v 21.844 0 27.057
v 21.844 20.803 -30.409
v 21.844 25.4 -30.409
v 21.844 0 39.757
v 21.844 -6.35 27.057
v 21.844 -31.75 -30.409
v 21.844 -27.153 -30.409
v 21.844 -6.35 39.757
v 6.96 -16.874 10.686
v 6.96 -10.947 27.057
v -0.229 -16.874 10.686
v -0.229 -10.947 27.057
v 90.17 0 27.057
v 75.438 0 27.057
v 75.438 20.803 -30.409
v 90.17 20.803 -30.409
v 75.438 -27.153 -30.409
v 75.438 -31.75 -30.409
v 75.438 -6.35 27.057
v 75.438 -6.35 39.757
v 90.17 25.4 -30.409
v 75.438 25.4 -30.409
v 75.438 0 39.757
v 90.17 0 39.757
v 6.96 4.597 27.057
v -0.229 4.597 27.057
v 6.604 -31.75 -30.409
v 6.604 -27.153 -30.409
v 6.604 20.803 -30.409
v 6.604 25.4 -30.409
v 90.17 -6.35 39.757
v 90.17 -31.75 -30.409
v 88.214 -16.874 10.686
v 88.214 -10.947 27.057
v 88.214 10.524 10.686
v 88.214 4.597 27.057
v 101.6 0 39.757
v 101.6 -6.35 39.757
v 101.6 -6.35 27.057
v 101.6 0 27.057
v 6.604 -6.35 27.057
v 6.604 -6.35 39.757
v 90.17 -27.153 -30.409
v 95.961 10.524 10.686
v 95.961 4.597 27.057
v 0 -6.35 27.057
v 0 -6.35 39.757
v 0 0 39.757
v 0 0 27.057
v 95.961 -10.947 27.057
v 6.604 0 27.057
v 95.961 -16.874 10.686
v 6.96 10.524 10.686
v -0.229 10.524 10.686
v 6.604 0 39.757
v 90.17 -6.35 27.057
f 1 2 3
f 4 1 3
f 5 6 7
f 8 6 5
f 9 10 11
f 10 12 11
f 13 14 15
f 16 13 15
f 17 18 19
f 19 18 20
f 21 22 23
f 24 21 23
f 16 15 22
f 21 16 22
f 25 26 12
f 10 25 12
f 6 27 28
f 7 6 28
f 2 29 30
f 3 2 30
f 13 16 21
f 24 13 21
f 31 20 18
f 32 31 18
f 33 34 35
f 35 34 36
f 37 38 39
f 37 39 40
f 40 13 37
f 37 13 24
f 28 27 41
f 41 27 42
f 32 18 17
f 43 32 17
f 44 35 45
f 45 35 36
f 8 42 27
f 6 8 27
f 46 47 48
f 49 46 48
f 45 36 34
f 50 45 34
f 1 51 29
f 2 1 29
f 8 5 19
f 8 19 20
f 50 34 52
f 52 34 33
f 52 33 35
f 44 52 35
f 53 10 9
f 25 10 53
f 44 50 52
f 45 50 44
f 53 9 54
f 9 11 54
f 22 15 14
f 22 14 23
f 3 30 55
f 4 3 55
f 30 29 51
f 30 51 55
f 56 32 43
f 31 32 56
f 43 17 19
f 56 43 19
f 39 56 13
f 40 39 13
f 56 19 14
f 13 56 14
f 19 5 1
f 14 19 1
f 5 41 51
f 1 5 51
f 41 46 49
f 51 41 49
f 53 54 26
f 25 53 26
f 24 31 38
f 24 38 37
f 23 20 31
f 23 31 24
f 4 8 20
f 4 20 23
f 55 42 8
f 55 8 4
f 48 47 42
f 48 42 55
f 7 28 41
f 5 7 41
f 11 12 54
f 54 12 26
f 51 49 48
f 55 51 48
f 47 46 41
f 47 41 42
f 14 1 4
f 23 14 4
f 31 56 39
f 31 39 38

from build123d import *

# Parameters (mm, degrees)
F0_W          = 6.35
F0_H          = 12.7
F1_DEPTH      = 101.6
F2_START      = 6.604
F2_DEPTH      = 14.224
F3_START      = 75.438
F3_DEPTH      = 14.732
F4_START      = 6.604
F4_DEPTH      = 15.24
F5_DEPTH      = 0.2286
F5_DEPTH_BACK = 6.9596
F6_START      = 88.2142
F6_DEPTH      = 7.747


with BuildPart() as f1:
    # F0 (on Right) → F1 (new body)
    with BuildSketch(Plane.YZ):
        with Locations((-3.175, 33.4065240977)):
            Rectangle(F0_W, F0_H)
    extrude(amount=F1_DEPTH)

    # F0 (on Right) → F2 (join)
    with BuildSketch(Plane.YZ.offset(F2_START)):
        Polygon((-6.35, 27.0565240977), (-6.35, 39.7565240977), (-10.9474, 27.0565240977), align=None)
        Polygon((-12.2761771333, 10.6858690333), (-6.35, 27.0565240977), (-10.9474, 27.0565240977), (-16.8735771333, 10.6858690333), align=None)
        Polygon((4.5974, 27.0565240977), (0, 39.7565240977), (0, 27.0565240977), align=None)
        Polygon((4.5974, 27.0565240977), (0, 27.0565240977), (5.9261771333, 10.6858690333), (10.5235771333, 10.6858690333), align=None)
        Polygon((-27.1526, -30.4092217587), (-12.2761771333, 10.6858690333), (-16.8735771333, 10.6858690333), (-31.75, -30.4092217587), align=None)
        Polygon((10.5235771333, 10.6858690333), (5.9261771333, 10.6858690333), (20.8026, -30.4092217587), (25.4, -30.4092217587), align=None)
    extrude(amount=F2_DEPTH)

    # F0 (on Right) → F3 (join)
    with BuildSketch(Plane.YZ.offset(F3_START)):
        Polygon((10.5235771333, 10.6858690333), (5.9261771333, 10.6858690333), (20.8026, -30.4092217587), (25.4, -30.4092217587), align=None)
        Polygon((4.5974, 27.0565240977), (0, 27.0565240977), (5.9261771333, 10.6858690333), (10.5235771333, 10.6858690333), align=None)
        Polygon((-12.2761771333, 10.6858690333), (-6.35, 27.0565240977), (-10.9474, 27.0565240977), (-16.8735771333, 10.6858690333), align=None)
        Polygon((-6.35, 27.0565240977), (-6.35, 39.7565240977), (-10.9474, 27.0565240977), align=None)
        Polygon((4.5974, 27.0565240977), (0, 39.7565240977), (0, 27.0565240977), align=None)
        Polygon((-27.1526, -30.4092217587), (-12.2761771333, 10.6858690333), (-16.8735771333, 10.6858690333), (-31.75, -30.4092217587), align=None)
    extrude(amount=F3_DEPTH)

    # F0 (on Right) → F4 (join)
    with BuildSketch(Plane.YZ.offset(F4_START)):
        Polygon((10.5235771333, 10.6858690333), (5.9261771333, 10.6858690333), (20.8026, -30.4092217587), (25.4, -30.4092217587), align=None)
        Polygon((-27.1526, -30.4092217587), (-12.2761771333, 10.6858690333), (-16.8735771333, 10.6858690333), (-31.75, -30.4092217587), align=None)
        Polygon((4.5974, 27.0565240977), (0, 39.7565240977), (0, 27.0565240977), align=None)
        Polygon((-6.35, 27.0565240977), (-6.35, 39.7565240977), (-10.9474, 27.0565240977), align=None)
        with Locations((-3.175, 33.4065240977)):
            Rectangle(F0_W, F0_H)
        Polygon((4.5974, 27.0565240977), (0, 27.0565240977), (5.9261771333, 10.6858690333), (10.5235771333, 10.6858690333), align=None)
        Polygon((-12.2761771333, 10.6858690333), (-6.35, 27.0565240977), (-10.9474, 27.0565240977), (-16.8735771333, 10.6858690333), align=None)
    extrude(amount=F4_DEPTH)


with BuildPart() as f5:
    # F0 (on Right) → F5 (new body, two sides)
    with BuildSketch(Plane.YZ) as f5_sk:
        Polygon((4.5974, 27.0565240977), (0, 27.0565240977), (5.9261771333, 10.6858690333), (10.5235771333, 10.6858690333), align=None)
        Polygon((5.9261771333, 10.6858690333), (0, 27.0565240977), (-6.35, 27.0565240977), (-12.2761771333, 10.6858690333), align=None)
        Polygon((-12.2761771333, 10.6858690333), (-6.35, 27.0565240977), (-10.9474, 27.0565240977), (-16.8735771333, 10.6858690333), align=None)
    extrude(amount=-F5_DEPTH)
    extrude(f5_sk.sketch, amount=F5_DEPTH_BACK)


with BuildPart() as f6:
    # F0 (on Right) → F6 (new body)
    with BuildSketch(Plane.YZ.offset(F6_START)):
        Polygon((4.5974, 27.0565240977), (0, 27.0565240977), (5.9261771333, 10.6858690333), (10.5235771333, 10.6858690333), align=None)
        Polygon((-12.2761771333, 10.6858690333), (-6.35, 27.0565240977), (-10.9474, 27.0565240977), (-16.8735771333, 10.6858690333), align=None)
        Polygon((5.9261771333, 10.6858690333), (0, 27.0565240977), (-6.35, 27.0565240977), (-12.2761771333, 10.6858690333), align=None)
    extrude(amount=F6_DEPTH)


solid = Compound([f1.part, f5.part, f6.part])
